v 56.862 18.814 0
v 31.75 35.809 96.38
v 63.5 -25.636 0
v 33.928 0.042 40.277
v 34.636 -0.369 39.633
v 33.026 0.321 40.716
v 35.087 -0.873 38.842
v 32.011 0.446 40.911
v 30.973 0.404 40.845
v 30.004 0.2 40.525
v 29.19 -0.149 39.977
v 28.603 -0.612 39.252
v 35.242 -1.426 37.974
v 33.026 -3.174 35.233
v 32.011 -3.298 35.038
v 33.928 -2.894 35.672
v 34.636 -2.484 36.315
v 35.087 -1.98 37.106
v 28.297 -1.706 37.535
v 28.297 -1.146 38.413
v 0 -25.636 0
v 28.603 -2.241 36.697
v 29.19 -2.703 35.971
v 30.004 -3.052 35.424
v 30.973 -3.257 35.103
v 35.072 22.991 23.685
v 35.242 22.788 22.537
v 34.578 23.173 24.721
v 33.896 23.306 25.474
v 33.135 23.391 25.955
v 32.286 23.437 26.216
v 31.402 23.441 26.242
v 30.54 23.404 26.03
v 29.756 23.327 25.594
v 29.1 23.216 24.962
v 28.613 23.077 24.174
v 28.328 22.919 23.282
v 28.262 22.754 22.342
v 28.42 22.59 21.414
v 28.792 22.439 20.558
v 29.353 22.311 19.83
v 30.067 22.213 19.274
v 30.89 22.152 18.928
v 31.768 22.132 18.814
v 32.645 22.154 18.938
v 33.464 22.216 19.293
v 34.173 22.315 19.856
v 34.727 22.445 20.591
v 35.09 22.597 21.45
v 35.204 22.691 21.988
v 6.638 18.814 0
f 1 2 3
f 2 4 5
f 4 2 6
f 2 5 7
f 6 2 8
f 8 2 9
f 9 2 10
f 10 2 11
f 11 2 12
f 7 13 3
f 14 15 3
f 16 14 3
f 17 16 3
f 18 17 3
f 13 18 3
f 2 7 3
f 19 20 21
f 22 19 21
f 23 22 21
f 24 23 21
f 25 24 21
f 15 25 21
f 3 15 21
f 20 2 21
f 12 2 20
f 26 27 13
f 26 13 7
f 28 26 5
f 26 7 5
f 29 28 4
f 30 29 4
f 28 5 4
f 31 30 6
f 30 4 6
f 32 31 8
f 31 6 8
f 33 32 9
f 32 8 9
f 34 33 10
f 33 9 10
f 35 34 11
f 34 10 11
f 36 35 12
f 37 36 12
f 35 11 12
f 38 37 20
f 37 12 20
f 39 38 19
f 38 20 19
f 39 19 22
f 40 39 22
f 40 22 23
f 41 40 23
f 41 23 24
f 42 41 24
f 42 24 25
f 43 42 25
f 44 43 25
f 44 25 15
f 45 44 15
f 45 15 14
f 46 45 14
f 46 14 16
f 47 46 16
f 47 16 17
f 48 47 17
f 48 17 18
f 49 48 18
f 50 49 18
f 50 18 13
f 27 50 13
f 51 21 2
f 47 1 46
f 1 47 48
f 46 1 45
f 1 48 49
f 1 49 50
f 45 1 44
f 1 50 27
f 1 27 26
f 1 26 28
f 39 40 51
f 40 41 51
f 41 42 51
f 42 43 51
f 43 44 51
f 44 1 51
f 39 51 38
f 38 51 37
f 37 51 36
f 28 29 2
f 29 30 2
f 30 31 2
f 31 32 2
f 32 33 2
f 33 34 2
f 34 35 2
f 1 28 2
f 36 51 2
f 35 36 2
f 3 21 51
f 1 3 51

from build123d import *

# Parameters (mm, degrees)
F1_DEPTH = 63.5
F3_DEPTH = 51.8120278971
F4_R     = 3.4925
F5_DEPTH = 51.8120278971


with BuildPart() as f1:
    # F0 (on Right) → F1 (new body)
    with BuildSketch(Plane.YZ):
        Polygon((35.8086346566, 96.3798694051), (-25.6357367167, 0), (18.8142632833, 0), align=None)
    extrude(amount=F1_DEPTH)

    # F2 (on face) → F3 (cut, through all)
    with BuildSketch(Plane(origin=(0, -18.2274539145, 11.6204188118), x_dir=(1, 0, 0), z_dir=(0, -0.843218455, 0.5375710531))):
        Polygon((63.5, 100.5189700153), (31.75, 100.5189700153), (63.5, -13.7810299847), align=None)
        Polygon((0, 100.5189700153), (0, -13.7810299847), (31.75, 100.5189700153), align=None)
    extrude(amount=-F3_DEPTH, mode=Mode.SUBTRACT)

    # F4 (on face) → F5 (cut, through all)
    with BuildSketch(Plane(origin=(0, -18.2274539145, 11.6204188118), x_dir=(1, 0, 0), z_dir=(0, -0.843218455, 0.5375710531))):
        with Locations((31.75, 31.2540056114)):
            Circle(F4_R)
    extrude(amount=-F5_DEPTH, mode=Mode.SUBTRACT)


solid = f1.part
